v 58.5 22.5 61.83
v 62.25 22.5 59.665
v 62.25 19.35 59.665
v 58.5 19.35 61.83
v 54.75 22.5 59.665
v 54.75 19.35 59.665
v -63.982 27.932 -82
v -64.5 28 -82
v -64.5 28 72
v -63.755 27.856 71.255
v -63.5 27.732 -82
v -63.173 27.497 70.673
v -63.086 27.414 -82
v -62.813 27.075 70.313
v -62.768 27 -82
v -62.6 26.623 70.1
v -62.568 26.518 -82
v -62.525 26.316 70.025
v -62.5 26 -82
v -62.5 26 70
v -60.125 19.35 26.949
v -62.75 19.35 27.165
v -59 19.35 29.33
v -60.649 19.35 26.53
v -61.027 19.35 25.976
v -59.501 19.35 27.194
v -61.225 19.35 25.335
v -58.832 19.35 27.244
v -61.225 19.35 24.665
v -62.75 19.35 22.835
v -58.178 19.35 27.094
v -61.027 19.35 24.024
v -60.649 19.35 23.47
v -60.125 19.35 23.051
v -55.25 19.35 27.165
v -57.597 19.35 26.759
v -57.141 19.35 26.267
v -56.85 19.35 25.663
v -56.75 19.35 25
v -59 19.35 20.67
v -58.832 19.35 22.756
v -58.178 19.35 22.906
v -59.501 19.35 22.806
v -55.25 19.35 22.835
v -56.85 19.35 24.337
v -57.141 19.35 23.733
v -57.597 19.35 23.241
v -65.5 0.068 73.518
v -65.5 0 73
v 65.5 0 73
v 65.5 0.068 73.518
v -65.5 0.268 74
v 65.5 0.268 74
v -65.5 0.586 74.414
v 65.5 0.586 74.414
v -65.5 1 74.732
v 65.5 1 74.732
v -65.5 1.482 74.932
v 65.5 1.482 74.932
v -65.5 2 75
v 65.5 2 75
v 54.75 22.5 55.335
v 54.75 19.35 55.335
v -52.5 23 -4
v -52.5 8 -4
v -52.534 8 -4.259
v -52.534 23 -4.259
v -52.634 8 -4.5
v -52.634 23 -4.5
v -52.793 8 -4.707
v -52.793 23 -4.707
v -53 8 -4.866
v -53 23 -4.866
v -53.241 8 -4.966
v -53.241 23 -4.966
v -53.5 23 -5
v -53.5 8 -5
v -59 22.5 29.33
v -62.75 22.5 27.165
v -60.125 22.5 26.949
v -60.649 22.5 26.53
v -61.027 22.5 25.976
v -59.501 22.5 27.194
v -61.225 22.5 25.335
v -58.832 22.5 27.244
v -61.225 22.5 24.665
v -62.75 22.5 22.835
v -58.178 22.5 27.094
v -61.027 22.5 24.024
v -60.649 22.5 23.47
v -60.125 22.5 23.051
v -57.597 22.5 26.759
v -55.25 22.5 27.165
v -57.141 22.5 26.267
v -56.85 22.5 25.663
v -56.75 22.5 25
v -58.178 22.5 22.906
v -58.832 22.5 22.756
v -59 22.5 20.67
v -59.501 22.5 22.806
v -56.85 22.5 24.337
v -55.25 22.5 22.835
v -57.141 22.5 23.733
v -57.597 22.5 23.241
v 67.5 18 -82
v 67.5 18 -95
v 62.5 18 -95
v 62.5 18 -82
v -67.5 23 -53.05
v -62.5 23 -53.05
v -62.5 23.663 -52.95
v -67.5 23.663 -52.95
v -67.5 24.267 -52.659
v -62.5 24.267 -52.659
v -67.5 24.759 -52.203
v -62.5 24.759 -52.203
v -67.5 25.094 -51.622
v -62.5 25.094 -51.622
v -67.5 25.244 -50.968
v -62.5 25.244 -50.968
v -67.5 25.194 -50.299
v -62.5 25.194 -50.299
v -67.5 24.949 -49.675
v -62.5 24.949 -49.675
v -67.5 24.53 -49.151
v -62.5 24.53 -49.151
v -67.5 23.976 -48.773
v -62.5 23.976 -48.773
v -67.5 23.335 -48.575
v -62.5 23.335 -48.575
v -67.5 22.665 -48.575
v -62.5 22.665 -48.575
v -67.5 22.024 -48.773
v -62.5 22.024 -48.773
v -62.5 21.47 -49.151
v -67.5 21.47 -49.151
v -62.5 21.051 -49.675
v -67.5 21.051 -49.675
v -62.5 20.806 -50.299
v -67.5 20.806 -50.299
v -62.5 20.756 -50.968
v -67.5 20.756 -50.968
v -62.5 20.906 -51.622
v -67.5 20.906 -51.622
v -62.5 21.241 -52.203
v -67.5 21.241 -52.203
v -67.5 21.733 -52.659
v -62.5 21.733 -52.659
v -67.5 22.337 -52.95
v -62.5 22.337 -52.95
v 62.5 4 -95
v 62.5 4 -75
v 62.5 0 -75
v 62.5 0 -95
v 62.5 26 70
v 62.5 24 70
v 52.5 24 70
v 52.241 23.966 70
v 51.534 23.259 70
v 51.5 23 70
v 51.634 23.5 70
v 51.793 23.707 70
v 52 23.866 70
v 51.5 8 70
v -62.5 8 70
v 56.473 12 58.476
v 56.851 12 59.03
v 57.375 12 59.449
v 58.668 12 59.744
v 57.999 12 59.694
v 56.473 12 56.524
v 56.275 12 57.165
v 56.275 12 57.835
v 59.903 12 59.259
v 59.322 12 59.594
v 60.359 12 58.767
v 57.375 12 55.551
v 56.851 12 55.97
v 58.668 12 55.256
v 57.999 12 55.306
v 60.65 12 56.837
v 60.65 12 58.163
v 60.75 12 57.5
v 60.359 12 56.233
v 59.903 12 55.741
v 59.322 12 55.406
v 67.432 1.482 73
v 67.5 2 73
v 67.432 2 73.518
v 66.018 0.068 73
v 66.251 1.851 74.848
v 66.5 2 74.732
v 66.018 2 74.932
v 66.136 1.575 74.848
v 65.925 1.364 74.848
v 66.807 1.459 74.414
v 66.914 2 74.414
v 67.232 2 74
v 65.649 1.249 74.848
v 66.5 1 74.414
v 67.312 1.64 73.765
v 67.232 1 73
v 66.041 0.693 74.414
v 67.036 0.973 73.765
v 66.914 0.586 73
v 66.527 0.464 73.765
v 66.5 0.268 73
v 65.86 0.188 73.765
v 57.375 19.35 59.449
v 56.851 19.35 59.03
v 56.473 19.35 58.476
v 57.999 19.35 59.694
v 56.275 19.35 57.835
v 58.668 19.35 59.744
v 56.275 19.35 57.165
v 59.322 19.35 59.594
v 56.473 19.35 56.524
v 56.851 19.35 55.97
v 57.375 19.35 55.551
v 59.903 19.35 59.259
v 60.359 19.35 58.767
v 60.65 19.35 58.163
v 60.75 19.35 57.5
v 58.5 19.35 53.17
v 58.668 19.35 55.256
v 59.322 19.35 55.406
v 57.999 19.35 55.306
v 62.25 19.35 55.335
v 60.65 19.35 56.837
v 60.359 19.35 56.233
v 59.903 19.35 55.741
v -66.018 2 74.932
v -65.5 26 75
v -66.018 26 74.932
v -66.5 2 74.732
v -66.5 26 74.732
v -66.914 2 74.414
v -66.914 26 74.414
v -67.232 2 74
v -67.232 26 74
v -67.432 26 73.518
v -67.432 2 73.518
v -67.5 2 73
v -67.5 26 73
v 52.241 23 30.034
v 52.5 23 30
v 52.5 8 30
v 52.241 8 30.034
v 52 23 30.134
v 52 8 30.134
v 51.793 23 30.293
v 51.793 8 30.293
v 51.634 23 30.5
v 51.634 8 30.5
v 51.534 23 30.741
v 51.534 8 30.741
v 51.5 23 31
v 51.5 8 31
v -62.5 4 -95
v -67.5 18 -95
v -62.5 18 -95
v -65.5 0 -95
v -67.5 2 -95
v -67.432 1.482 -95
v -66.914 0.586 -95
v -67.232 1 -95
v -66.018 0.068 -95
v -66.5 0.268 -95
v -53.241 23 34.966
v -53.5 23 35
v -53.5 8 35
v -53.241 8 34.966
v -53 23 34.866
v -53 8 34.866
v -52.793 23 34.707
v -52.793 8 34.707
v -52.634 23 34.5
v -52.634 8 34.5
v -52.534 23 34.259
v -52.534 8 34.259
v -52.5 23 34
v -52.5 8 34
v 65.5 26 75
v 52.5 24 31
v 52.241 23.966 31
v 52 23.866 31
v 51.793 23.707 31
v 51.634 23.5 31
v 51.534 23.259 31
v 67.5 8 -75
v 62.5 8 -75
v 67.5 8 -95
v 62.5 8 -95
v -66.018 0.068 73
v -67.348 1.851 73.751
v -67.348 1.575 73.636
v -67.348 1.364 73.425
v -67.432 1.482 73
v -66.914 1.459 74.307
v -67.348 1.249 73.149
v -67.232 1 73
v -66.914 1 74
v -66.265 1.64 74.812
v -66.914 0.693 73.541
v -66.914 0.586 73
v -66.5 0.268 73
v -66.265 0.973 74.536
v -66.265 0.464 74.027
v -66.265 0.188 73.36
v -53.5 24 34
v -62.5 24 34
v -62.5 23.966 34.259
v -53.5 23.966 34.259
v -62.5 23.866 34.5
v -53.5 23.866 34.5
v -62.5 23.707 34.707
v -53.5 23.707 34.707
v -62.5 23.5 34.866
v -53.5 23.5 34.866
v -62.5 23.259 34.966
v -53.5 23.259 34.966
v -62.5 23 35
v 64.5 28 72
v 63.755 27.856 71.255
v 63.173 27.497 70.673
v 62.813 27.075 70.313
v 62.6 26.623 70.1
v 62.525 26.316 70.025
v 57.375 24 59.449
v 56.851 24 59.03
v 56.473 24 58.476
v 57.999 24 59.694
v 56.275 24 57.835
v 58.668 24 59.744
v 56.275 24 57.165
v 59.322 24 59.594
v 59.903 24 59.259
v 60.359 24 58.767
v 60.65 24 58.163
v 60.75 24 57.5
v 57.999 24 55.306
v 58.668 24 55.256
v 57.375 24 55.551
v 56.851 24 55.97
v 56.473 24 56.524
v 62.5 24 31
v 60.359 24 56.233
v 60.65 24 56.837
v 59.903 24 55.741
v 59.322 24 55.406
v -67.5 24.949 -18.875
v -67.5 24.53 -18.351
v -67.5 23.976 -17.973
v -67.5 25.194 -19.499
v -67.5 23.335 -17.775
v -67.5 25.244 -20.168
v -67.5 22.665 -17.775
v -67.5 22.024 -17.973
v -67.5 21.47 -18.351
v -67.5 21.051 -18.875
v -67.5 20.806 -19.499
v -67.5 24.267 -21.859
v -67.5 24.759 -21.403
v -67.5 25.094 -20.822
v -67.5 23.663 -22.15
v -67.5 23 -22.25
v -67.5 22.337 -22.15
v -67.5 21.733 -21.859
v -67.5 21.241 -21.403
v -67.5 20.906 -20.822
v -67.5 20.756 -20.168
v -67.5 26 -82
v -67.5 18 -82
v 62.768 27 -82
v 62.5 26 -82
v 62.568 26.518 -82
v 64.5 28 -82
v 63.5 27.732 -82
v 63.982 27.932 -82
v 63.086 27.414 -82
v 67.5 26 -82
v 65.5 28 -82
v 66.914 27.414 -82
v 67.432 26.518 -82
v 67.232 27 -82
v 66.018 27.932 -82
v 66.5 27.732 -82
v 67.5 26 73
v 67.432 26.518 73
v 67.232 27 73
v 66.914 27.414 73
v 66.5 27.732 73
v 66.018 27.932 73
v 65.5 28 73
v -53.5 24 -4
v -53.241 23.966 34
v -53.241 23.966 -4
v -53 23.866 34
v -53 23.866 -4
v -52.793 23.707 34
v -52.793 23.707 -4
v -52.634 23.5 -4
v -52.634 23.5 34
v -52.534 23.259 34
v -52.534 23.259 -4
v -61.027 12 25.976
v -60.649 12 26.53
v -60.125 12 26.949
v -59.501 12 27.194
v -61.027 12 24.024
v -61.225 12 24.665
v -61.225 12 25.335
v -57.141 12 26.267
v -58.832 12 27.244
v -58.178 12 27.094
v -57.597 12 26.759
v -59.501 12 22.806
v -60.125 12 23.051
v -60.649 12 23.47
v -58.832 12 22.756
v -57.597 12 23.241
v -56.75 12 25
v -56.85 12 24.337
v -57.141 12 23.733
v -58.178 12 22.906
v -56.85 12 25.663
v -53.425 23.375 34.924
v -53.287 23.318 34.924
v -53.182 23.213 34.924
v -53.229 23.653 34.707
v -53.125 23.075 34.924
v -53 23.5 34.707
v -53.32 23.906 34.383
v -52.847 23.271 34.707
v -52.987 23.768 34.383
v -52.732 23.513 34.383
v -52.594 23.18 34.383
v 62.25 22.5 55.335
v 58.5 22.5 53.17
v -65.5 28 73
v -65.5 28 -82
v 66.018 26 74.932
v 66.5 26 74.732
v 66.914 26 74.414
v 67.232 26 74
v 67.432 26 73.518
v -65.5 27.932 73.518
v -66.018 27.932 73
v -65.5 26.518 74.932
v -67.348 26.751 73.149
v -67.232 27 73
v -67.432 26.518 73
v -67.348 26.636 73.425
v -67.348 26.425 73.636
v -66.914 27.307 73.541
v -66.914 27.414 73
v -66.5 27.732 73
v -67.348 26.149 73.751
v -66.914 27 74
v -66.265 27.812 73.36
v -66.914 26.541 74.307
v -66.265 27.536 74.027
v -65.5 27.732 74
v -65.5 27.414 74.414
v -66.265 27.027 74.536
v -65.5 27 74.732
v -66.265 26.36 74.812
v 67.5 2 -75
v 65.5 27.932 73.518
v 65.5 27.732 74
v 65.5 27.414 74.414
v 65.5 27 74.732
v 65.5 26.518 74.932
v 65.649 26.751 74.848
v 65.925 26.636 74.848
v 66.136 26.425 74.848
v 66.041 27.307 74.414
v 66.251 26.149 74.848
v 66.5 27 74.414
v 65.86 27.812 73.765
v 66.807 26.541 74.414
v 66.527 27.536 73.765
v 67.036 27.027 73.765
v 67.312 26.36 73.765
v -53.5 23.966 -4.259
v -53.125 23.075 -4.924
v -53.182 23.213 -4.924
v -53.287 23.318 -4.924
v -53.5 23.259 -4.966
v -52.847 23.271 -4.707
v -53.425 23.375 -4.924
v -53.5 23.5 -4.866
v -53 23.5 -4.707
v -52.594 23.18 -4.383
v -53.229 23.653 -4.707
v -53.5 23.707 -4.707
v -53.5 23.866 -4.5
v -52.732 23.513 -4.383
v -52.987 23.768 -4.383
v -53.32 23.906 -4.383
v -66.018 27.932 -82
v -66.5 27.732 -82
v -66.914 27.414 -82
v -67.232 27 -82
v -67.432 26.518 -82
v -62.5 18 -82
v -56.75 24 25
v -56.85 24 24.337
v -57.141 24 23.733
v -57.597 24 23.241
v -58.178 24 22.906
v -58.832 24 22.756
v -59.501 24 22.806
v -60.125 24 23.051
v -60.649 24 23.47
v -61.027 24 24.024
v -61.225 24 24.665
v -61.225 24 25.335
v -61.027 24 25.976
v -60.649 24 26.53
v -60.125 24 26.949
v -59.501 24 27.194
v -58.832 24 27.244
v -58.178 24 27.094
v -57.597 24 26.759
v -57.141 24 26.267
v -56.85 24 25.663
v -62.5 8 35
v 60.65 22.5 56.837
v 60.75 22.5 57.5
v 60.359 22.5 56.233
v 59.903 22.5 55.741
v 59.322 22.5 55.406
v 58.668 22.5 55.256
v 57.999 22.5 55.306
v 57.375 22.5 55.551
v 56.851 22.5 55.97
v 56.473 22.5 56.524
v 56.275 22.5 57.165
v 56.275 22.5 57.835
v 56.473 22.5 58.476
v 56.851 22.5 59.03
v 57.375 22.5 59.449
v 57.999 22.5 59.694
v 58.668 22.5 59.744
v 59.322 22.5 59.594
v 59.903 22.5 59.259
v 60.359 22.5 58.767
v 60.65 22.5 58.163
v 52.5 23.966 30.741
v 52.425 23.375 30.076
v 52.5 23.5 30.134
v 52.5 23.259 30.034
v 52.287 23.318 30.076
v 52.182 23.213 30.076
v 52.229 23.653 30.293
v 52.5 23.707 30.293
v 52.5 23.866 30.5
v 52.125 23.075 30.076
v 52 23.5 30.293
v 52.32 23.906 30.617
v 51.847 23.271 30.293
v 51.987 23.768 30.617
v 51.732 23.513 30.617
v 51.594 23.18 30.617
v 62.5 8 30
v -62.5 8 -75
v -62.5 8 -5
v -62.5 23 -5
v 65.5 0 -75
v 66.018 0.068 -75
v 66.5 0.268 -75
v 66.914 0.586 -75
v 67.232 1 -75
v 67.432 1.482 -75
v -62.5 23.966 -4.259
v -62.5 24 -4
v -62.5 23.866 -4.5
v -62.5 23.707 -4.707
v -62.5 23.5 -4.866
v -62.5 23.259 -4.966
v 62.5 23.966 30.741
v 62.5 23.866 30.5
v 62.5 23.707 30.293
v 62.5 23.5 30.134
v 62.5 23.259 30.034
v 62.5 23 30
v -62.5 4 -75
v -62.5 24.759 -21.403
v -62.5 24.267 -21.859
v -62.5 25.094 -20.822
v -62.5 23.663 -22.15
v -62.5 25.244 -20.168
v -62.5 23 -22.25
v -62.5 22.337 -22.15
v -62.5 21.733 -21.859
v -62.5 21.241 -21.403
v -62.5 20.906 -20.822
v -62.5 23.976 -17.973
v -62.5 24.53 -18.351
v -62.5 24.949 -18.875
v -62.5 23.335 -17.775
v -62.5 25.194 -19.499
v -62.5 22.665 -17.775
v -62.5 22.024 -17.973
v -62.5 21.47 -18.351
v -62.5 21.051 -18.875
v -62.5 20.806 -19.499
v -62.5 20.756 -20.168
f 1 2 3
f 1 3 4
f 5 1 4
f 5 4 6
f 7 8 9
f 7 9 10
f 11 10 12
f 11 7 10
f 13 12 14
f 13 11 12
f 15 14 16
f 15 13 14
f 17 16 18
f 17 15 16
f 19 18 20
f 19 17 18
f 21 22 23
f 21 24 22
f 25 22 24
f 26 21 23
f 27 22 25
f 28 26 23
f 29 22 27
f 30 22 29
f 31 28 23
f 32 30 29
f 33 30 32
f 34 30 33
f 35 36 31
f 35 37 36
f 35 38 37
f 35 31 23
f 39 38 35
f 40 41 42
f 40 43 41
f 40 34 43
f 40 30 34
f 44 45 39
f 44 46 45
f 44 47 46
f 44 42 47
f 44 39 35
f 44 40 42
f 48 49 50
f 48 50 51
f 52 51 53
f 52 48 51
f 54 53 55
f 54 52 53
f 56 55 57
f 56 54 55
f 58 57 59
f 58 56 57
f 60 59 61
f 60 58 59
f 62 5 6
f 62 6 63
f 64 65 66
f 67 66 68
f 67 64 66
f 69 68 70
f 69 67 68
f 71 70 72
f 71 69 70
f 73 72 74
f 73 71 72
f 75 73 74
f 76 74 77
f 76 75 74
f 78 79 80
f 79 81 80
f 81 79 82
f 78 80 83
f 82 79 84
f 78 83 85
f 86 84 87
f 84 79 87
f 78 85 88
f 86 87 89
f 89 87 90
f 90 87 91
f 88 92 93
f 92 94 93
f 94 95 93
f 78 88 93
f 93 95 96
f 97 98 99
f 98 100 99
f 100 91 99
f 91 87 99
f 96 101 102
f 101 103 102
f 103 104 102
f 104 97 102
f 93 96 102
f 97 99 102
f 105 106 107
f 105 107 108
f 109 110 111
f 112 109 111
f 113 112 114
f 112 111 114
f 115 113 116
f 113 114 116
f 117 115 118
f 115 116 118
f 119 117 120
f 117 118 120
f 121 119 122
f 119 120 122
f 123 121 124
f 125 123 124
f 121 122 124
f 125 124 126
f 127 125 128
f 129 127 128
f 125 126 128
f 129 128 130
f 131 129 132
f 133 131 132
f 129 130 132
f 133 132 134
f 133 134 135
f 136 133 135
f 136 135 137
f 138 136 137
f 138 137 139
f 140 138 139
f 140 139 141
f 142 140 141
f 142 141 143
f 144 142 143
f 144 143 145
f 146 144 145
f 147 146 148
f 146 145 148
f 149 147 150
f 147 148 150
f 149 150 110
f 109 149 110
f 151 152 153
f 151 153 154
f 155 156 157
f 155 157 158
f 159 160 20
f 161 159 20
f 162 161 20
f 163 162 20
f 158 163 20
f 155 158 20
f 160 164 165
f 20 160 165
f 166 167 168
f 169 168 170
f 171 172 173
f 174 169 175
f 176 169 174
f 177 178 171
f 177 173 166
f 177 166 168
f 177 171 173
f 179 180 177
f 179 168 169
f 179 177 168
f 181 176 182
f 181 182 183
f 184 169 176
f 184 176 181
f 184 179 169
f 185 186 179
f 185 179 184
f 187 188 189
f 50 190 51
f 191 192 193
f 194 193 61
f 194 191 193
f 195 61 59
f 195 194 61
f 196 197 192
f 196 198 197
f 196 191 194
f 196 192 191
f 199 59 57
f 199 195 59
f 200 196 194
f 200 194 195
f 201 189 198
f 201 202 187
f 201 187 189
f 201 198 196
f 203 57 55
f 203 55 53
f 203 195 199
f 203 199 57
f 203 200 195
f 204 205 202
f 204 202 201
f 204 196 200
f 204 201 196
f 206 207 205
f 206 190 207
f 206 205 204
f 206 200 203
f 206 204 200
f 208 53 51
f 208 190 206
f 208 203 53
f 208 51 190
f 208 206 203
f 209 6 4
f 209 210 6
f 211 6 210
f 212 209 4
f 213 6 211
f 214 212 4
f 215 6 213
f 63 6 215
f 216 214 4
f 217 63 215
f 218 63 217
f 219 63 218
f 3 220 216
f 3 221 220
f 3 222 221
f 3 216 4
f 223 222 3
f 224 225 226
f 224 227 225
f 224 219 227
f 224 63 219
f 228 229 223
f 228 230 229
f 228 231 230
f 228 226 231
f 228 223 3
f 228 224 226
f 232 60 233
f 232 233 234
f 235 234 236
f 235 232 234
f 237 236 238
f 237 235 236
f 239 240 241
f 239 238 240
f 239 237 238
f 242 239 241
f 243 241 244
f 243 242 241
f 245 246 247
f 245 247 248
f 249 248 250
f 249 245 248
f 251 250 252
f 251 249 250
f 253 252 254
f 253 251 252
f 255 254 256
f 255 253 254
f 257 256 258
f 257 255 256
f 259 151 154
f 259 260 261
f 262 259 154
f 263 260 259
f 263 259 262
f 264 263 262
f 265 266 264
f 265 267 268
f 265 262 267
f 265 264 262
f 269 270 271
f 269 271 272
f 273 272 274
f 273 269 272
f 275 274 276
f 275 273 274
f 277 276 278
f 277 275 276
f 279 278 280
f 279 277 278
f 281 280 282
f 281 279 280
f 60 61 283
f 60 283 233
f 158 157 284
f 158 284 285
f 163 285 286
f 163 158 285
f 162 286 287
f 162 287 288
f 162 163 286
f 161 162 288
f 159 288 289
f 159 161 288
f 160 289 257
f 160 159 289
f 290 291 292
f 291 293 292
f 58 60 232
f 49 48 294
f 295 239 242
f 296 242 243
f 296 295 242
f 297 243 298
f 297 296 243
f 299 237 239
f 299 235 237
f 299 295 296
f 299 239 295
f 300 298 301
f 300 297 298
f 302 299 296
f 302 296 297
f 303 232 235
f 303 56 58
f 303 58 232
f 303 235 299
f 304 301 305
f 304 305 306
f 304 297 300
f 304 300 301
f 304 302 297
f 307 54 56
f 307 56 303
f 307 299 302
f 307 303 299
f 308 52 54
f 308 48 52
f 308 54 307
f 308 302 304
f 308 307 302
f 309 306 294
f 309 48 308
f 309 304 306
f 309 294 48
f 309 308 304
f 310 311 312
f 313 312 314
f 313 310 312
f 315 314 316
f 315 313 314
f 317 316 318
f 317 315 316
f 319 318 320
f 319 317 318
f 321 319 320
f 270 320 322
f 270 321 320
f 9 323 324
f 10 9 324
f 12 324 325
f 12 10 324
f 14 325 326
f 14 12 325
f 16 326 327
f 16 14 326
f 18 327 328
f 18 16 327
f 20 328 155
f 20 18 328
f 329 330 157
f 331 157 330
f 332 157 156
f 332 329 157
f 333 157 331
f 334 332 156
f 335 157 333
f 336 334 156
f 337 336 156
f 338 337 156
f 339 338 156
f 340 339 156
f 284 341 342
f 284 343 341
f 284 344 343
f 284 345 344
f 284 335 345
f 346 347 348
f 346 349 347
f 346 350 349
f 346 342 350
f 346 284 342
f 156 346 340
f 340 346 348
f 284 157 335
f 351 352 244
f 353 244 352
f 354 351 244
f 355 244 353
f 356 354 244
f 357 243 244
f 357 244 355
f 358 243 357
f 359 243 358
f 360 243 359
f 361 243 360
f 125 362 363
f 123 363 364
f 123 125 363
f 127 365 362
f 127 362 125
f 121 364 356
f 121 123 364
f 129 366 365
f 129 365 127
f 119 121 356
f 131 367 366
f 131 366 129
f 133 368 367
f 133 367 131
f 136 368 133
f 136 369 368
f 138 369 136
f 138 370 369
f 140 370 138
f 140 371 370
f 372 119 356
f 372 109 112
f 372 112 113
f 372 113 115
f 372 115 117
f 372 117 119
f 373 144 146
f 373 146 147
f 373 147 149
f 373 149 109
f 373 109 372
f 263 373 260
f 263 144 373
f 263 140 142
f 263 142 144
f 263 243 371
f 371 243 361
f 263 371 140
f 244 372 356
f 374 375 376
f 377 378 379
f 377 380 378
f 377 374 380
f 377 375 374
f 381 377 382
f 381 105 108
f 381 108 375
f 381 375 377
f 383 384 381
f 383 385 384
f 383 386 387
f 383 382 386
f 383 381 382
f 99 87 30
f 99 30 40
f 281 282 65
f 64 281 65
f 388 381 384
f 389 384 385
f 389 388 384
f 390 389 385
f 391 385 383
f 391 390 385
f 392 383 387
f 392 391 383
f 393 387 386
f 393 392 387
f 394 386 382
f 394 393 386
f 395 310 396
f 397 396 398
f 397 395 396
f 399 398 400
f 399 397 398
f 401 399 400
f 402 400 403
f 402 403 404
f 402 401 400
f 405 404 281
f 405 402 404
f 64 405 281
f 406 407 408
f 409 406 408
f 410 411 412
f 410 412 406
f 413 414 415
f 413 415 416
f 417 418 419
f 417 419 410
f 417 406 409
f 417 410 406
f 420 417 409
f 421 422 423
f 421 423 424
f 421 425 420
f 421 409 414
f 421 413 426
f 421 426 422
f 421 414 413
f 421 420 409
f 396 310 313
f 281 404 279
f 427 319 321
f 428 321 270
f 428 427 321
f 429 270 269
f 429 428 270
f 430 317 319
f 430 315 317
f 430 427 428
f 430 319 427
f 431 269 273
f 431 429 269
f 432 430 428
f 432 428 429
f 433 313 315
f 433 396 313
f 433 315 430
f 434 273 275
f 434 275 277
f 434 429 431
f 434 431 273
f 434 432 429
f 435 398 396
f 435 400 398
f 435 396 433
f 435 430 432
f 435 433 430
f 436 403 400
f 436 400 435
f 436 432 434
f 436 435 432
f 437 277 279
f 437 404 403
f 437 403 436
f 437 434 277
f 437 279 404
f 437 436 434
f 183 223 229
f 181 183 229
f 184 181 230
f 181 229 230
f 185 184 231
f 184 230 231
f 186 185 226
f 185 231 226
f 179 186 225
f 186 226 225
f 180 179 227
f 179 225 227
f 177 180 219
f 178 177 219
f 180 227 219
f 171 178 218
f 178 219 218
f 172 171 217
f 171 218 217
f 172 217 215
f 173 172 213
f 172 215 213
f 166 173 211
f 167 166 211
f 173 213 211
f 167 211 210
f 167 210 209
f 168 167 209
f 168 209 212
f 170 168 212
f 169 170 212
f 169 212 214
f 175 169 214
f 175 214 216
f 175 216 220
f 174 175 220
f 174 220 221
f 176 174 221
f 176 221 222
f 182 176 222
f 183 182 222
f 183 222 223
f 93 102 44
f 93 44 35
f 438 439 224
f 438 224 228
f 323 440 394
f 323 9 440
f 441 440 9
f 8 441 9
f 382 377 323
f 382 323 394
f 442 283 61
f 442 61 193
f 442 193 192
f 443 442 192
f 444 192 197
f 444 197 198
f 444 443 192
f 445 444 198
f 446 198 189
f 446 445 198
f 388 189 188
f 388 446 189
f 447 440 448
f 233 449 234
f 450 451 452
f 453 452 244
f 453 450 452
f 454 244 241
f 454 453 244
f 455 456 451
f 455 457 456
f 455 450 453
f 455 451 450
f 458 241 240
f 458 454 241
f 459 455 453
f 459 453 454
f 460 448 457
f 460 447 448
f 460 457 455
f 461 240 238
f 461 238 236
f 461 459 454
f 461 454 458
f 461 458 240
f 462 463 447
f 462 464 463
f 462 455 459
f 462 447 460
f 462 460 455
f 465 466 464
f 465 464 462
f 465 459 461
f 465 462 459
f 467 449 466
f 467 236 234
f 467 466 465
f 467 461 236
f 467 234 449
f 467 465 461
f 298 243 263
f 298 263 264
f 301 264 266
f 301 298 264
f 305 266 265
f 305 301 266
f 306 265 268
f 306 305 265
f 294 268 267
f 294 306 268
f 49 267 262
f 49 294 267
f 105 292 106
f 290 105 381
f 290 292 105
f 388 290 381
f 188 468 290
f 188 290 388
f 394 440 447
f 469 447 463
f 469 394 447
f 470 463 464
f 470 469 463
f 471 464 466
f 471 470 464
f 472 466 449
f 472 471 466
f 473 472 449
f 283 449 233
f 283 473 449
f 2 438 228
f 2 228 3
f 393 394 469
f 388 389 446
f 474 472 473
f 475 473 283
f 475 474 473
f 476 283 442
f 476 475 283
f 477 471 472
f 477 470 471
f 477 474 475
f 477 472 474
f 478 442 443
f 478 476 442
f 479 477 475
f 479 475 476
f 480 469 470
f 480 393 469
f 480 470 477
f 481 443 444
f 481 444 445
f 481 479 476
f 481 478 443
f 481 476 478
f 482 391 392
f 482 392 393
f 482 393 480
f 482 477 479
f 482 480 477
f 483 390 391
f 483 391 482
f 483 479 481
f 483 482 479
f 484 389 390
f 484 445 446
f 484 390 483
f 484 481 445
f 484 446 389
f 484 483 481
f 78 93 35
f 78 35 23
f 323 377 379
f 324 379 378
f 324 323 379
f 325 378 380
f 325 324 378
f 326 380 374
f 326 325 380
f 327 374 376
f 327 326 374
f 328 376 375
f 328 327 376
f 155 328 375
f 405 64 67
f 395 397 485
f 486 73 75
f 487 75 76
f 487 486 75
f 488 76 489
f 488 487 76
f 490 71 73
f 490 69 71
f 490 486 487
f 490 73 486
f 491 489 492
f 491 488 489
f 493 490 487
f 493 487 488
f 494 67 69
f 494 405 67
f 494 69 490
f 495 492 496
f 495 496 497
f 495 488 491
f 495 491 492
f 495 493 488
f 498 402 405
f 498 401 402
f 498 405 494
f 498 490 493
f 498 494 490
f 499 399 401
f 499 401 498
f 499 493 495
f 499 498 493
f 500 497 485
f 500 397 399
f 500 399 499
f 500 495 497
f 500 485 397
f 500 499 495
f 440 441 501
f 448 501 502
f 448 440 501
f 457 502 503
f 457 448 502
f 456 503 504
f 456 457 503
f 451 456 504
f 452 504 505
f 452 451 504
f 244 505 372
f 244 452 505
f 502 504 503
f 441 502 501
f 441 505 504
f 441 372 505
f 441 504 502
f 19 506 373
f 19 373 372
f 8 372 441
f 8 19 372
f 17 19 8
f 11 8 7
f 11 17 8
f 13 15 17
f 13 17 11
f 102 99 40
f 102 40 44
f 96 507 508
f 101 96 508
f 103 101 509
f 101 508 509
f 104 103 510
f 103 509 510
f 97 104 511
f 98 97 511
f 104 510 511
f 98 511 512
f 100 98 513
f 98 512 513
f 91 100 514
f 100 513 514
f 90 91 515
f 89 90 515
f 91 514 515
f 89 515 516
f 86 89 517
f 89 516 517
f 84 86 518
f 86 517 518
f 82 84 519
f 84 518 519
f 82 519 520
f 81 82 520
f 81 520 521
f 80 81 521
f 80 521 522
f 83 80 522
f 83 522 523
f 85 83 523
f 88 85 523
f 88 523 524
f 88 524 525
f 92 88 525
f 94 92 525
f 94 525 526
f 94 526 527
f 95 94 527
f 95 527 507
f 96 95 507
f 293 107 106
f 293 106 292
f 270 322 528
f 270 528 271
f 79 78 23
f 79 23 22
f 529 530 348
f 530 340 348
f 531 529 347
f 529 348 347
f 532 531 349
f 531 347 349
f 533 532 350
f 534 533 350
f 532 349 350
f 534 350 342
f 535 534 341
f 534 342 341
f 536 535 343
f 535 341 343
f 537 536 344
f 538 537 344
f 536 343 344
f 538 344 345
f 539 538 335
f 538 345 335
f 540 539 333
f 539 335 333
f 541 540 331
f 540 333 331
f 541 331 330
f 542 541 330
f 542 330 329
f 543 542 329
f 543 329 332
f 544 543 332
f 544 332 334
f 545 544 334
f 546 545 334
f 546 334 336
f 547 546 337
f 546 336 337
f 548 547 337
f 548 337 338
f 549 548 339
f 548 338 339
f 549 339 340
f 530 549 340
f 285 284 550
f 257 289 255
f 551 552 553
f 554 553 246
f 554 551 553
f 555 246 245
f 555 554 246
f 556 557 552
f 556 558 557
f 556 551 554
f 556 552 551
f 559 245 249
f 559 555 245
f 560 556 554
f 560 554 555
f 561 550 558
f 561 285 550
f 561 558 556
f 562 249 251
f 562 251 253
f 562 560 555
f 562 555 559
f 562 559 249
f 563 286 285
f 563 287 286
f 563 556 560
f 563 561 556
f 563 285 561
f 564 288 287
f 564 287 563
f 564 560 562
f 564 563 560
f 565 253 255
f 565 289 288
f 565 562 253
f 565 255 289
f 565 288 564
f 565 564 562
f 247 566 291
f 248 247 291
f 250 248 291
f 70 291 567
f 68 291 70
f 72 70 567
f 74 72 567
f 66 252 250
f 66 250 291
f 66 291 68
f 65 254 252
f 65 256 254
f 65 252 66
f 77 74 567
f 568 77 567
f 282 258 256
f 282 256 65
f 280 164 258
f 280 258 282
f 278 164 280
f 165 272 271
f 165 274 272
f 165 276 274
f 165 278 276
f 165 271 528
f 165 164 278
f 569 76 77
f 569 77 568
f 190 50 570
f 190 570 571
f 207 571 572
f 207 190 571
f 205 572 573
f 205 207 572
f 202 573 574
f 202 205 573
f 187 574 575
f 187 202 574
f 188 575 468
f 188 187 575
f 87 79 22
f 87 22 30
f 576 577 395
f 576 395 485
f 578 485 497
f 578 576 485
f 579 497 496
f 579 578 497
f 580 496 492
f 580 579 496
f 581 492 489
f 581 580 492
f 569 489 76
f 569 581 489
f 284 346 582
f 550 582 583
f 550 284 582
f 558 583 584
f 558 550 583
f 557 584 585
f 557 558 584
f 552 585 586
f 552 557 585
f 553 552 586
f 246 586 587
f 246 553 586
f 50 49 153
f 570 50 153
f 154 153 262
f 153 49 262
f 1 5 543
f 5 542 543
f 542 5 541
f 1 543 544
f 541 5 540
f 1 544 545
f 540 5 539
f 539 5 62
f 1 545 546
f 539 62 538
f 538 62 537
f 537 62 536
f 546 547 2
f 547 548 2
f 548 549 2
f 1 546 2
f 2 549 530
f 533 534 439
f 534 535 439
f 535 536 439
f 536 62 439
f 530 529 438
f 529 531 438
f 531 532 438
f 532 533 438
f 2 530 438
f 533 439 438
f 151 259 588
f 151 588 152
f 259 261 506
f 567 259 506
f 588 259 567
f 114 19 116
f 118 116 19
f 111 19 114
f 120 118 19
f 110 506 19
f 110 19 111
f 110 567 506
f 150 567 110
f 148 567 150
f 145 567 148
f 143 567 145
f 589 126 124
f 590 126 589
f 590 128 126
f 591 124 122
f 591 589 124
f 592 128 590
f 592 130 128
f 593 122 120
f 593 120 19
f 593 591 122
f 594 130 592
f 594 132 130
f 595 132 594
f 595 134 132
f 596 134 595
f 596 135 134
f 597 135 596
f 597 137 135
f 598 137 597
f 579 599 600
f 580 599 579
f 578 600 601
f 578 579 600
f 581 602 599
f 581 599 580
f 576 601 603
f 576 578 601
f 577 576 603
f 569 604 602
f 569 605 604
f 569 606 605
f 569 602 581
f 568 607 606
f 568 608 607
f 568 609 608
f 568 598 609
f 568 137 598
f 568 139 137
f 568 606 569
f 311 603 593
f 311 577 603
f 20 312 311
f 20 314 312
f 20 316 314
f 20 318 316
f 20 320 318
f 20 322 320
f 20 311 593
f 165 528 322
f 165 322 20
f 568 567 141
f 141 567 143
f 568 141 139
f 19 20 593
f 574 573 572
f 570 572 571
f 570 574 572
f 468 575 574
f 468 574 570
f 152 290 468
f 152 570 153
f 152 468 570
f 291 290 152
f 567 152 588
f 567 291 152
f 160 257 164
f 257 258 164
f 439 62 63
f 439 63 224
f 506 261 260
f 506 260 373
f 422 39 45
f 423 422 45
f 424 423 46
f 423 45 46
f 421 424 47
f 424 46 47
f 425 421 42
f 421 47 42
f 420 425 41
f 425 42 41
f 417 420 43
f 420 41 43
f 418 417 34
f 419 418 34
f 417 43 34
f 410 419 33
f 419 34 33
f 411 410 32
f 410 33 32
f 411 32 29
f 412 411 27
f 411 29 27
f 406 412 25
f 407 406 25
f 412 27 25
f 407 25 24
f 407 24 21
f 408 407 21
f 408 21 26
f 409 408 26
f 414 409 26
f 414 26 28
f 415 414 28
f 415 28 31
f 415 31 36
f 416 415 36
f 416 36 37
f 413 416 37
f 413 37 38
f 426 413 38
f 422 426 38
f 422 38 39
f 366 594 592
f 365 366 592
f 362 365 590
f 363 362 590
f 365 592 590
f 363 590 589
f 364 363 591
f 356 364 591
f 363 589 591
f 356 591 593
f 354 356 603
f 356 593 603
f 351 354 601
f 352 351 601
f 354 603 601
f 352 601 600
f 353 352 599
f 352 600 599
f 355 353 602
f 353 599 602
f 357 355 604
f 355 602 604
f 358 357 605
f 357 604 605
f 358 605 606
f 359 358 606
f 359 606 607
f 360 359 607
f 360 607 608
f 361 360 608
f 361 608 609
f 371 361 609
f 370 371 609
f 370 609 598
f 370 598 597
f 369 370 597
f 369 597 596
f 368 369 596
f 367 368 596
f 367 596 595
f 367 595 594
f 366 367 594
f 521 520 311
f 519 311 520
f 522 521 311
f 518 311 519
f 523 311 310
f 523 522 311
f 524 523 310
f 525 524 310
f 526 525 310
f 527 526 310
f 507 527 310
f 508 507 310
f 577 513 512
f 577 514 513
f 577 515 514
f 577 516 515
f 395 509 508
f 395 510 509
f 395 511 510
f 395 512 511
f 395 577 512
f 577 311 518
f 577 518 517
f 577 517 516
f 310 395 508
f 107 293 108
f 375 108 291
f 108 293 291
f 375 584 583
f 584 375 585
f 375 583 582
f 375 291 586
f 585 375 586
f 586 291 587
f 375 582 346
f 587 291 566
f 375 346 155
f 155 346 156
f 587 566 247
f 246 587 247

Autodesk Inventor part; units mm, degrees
ref_plane "YZ Plane" through (0, 0, 0) normal (1, 0, 0) x (0, 1, 0)
ref_plane "XZ Plane" through (0, 0, 0) normal (0, 1, 0) x (-1, 0, 0)
sketch "Sketch1" plane through (0, 0, 0) normal (0, 1, 0) x (-1, 0, 0)
  line L0 (-67.5, 75) -> (67.5, 75)
  line L1 (67.5, 75) -> (67.5, -75)
  line L2 (67.5, -75) -> (-67.5, -75)
  line L3 (-67.5, -75) -> (-67.5, 75)
  line L4 (-67.5, 75) -> (67.5, -75) construction
  line L5 (67.5, 75) -> (-67.5, -75) construction
  point P0 (0, 0)
  dimension "d0" = 135
  dimension "d1" = 150
extrude "Extrusion1" add sketch "Sketch1" along normal blind 8
sketch "Sketch3" plane through (0, 8, 0) normal (0, 1, 0) x (1, 0, 0)
  line L0 (-67.5, -75) -> (67.5, -75) projected
  line L1 (67.5, -75) -> (67.5, 75) projected
  line L2 (67.5, 75) -> (-67.5, 75) projected
  line L3 (-67.5, 75) -> (-67.5, -75) projected
  line L4 (62.5, 75) -> (62.5, -70)
  line L5 (-67.5, -75) -> (67.5, -75) projected
  line L6 (67.5, -75) -> (67.5, 75) projected
  line L7 (0, 0) -> (0, -83) construction
  line L8 (-62.5, 75) -> (-62.5, -70)
  line L9 (62.5, -70) -> (-62.5, -70)
  dimension "d4" = 5
  dimension "d5" = 5
extrude "Extrusion2" add sketch "Sketch3" along normal blind 20 contours L3 L2 L8 L9 L4 L1 L0
sketch "Sketch4" plane through (67.5, 0, -75) normal (0, 0, -1) x (-1, 0, 0)
  line L0 (135, 0) -> (0, 0) projected
  line L1 (135, 0) -> (135, 28) projected
  line L2 (130, 28) -> (135, 28) projected
  line L3 (130, 8) -> (130, 28) projected
  line L4 (5, 8) -> (130, 8) projected
  line L5 (5, 8) -> (5, 28) projected
  line L6 (0, 28) -> (5, 28) projected
  line L7 (0, 0) -> (0, 28) projected
  line L8 (130, 8) -> (5, 8) projected
  line L9 (5, 8) -> (5, 0)
  line L10 (130, 8) -> (130, 0)
  line L11 (0, 0) -> (135, 0) projected
  line L12 (0, 0) -> (0, 28) projected
  line L13 (5, 0) -> (130, 0)
  line L14 (5, 8) -> (130, 8) projected
  line L15 (5, 4) -> (130, 4)
  line L16 (5, 8) -> (0, 8)
  line L17 (135, 0) -> (0, 0) projected
  point P0 (67.5, 0)
  dimension "d8" = 0
  dimension "d9" = 4
extrude "Extrusion3" add sketch "Sketch4" along normal blind 20 contours L0 L10 L3 L2 L1 | L0 L9 L15 L10 | L15 L9 L4 L10 | L7 L6 L5 L16
sketch "Sketch6" plane through (67.5, 0, 75) normal (1, 0, 0) x (0, 0, -1)
  line L0 (150, 0) -> (150, 8)
  line L1 (0, 0) -> (0, 28) projected
  line L2 (170, 18) -> (157, 18)
  line L3 (157, 18) -> (157, 28)
  line L4 (157, 28) -> (170, 28)
  line L5 (170, 28) -> (170, 18)
  line L6 (170, 28) -> (170, 8) projected
  line L7 (150, 8) -> (170, 8) projected
  line L8 (0, 28) -> (170, 28) projected
  point P0 (75, 0)
  dimension "d83" = 10
  dimension "d85" = 10
  dimension "d86" = 0
  dimension "d87" = 13
  dimension "d88" = 0
  dimension "d89" = 0
extrude "Extrusion4" cut sketch "Sketch6" against normal through all
fillet "Fillet1" radius 2 11 edges at (67.5, 0, 0) (67.5, 28, -3.5) (67.5, 14, 75) (0, 28, 75) (0, 0, 75) (-67.5, 28, -3.5) (-67.5, 14, 75) (-67.5, 0, -10) (62.5, 28, -6) (-62.5, 28, -6) (0, 28, 70)
sketch "Sketch11" plane through (-67.5, 9.7, -88) normal (-1, 0, 0) x (0, 0, 1)
  line L0 (9, 17.5) -> (0, 19.5) projected
  line L1 (0, 19.5) -> (0, 11.5) projected
  line L2 (0, 11.5) -> (9, 14) projected
  line L3 (9, 17.5) -> (9, 14) projected
  line L4 (9, 6) -> (0, 8.5) projected
  line L5 (0, 0) -> (9, 2.5) projected
  line L6 (0, 6) -> (0, 0) projected
  line L7 (9, 6) -> (9, 2.5) projected
  point P0 (88, -9.7)
sketch "Sketch12" plane through (-67.5, 2, 73) normal (-1, 0, 0) x (0, 0, 1)
  line L0 (-168, 28) -> (-168, 20)
  line L1 (-159, 26) -> (-168, 28)
  line L2 (-159, 26) -> (-159, 22.5)
  line L3 (-168, 20) -> (-159, 22.5)
  line L4 (-168, 17) -> (-168, 8.5)
  line L5 (-159, 14.5) -> (-168, 17)
  line L6 (-159, 14.5) -> (-159, 11)
  line L7 (-168, 8.5) -> (-159, 11)
  line L8 (-168, 0) -> (-168, 16) projected
  line L9 (-161, 19.2) -> (-161, 27.2) projected
  line L10 (-161, 27.2) -> (-168, 27.2)
  line L11 (-168, 16) -> (-168, 6) projected
  line L12 (-159, 17) -> (-168, 17)
  point P0 (-73, -2)
  point P1 (-168, 24)
sketch "Sketch15" plane through (62.5, 6, -75) normal (1, 0, 0) x (0, 0, -1)
  line L0 (0, -6) -> (0, 2) projected
  line L1 (20, 2) -> (20, -6) projected
  line L2 (0, 2) -> (20, 2) projected
  line L3 (0, -6) -> (20, -6) projected
  point P0 (-75, -6)
extrude "Extrusion8" add sketch "Sketch15" along normal blind 2.5
sketch "Sketch16" plane through (0, 8, 0) normal (0, 1, 0) x (1, 0, 0)
  line L0 (-62.5, -35) -> (-52.5, -35)
  line L1 (-52.5, -35) -> (-52.5, 5)
  line L2 (-52.5, 5) -> (-62.5, 5)
  line L3 (-62.5, 5) -> (-62.5, -35)
  line L4 (62.5, -70) -> (-62.5, -70) projected
  line L5 (-62.5, -70) -> (-62.5, 82) projected
  line L6 (51.5, -70) -> (62.5, -70)
  line L7 (62.5, -70) -> (62.5, -30)
  line L8 (62.5, -30) -> (51.5, -30)
  line L9 (51.5, -30) -> (51.5, -70)
  line L10 (62.5, 82) -> (62.5, -70) projected
  point P0 (0, 0)
  point P1 (-62.5, 95)
  point P2 (62.5, 95)
  dimension "d39" = 35
  dimension "d40" = 0
  dimension "d41" = 10
  dimension "d42" = 40
  dimension "d43" = 0
  dimension "d44" = 0
  dimension "d45" = 40
  dimension "d46" = 11
extrude "Extrusion9" add sketch "Sketch16" along normal blind 16
fillet "Fillet4" radius 1 8 edges at (51.5, 24, 50) (57, 24, 30) (51.5, 16, 30) (-52.5, 24, 15) (-52.5, 16, -5) (-57.5, 24, 35) (-57.5, 24, -5) (-52.5, 16, 35)
sketch "Sketch17" plane through (0, 24, 0) normal (0, 1, 0) x (1, 0, 0)
  circle A0 centre (-59, -25) radius 2.25
  line L0 (-62.5, -34) -> (-62.5, 4) projected
  line L1 (-53.5, -34) -> (-62.5, -34) projected
  circle A1 centre (58.5, -57.5) radius 2.25
  line L2 (52.5, -70) -> (52.5, -31) projected
  line L3 (52.5, -31) -> (62.5, -31) projected
  line L4 (62.5, -70) -> (50.5, -70) projected
  point P0 (0, 0)
  dimension "d50" = 4.5
  dimension "d51" = 3.5
  dimension "d52" = 9
  dimension "d53" = 4.5
  dimension "d54" = 6
  dimension "d90" = 12.5
extrude "Extrusion10" cut sketch "Sketch17" against normal blind 12
sketch "Sketch18" plane through (-62.5, 9.7, -88) normal (1, 0, 0) x (0, 0, -1)
  circle A0 centre (-68, 13.3) radius 2.25
  circle A1 centre (-37.2, 13.3) radius 2.25
  line L0 (0, 8.1) -> (0, 14.1)
  line L1 (-37.2, 13.3) -> (-68, 13.3)
  line L2 (-6, 18.3) -> (-160, 18.3) projected
  line L3 (-158, -1.7) -> (-158, 16.3) projected
  point P0 (-88, -9.7)
  point P1 (7, 18.3)
  dimension "d60" = 4.5
  dimension "d61" = 4.5
  dimension "d62" = 30.8
  dimension "d64" = 5
  dimension "d67" = 90
extrude "Extrusion11" cut sketch "Sketch18" against normal through all
ref_plane "Work Plane3" through (0, 22.5, 0) normal (0, 1, 0) x (1, 0, 0)
sketch "Sketch21" plane through (0, 22.5, 0) normal (0, 1, 0) x (1, 0, 0)
  circle A0 centre (58.5, -57.5) radius 2.25 projected
  line L0 (54.75, -55.3349) -> (58.5, -53.1699)
  line L1 (58.5, -53.1699) -> (62.25, -55.3349)
  line L2 (62.25, -55.3349) -> (62.25, -59.6651)
  line L3 (62.25, -59.6651) -> (58.5, -61.8301)
  line L4 (58.5, -61.8301) -> (54.75, -59.6651)
  line L5 (54.75, -59.6651) -> (54.75, -55.3349)
  line L6 (-62.5, -35) -> (-62.5, -70) projected
  line L7 (51.5, -70) -> (51.5, -31) projected
  circle A1 centre (-59, -25) radius 2.25 projected
  line L8 (-55.25, -27.1651) -> (-59, -29.3301)
  line L9 (-59, -29.3301) -> (-62.75, -27.1651)
  line L10 (-62.75, -27.1651) -> (-62.75, -22.8349)
  line L11 (-62.75, -22.8349) -> (-59, -20.6699)
  line L12 (-59, -20.6699) -> (-55.25, -22.8349)
  line L13 (-55.25, -22.8349) -> (-55.25, -27.1651)
  point P0 (0, 0)
  dimension "d78" = 7.5
  dimension "d79" = 7.5
extrude "Extrusion13" cut sketch "Sketch21" against normal blind 3.15
sketch "Sketch22" plane through (0, 8, 0) normal (0, 1, 0) x (1, 0, 0)
  line L0 (65, 75) -> (65, 95) projected
  line L1 (-62.5, 95) -> (62.5, 95) projected
  line L2 (65, 75) -> (67.5, 75) projected
  line L3 (-62.5, 95) -> (65, 95)
  line L4 (65, 95) -> (65, 75)
  line L5 (65, 75) -> (-62.5, 75)
  line L6 (-62.5, 75) -> (-62.5, 95)
  point P0 (0, 0)
extrude "Extrusion14" cut sketch "Sketch22" against normal blind 4
sketch "Sketch23" plane through (65, 6, -75) normal (1, 0, 0) x (0, 0, -1)
  line L0 (20, -2) -> (0, -2) projected
  line L1 (0, -6) -> (0, -2) projected
  line L2 (0, -6) -> (20, -6) projected
  line L3 (20, -6) -> (20, -2) projected
  point P0 (-75, -6)
extrude "Extrusion15" cut sketch "Sketch23" against normal up to surface (2.5 mm away)
properties part number "Case_metà1"
